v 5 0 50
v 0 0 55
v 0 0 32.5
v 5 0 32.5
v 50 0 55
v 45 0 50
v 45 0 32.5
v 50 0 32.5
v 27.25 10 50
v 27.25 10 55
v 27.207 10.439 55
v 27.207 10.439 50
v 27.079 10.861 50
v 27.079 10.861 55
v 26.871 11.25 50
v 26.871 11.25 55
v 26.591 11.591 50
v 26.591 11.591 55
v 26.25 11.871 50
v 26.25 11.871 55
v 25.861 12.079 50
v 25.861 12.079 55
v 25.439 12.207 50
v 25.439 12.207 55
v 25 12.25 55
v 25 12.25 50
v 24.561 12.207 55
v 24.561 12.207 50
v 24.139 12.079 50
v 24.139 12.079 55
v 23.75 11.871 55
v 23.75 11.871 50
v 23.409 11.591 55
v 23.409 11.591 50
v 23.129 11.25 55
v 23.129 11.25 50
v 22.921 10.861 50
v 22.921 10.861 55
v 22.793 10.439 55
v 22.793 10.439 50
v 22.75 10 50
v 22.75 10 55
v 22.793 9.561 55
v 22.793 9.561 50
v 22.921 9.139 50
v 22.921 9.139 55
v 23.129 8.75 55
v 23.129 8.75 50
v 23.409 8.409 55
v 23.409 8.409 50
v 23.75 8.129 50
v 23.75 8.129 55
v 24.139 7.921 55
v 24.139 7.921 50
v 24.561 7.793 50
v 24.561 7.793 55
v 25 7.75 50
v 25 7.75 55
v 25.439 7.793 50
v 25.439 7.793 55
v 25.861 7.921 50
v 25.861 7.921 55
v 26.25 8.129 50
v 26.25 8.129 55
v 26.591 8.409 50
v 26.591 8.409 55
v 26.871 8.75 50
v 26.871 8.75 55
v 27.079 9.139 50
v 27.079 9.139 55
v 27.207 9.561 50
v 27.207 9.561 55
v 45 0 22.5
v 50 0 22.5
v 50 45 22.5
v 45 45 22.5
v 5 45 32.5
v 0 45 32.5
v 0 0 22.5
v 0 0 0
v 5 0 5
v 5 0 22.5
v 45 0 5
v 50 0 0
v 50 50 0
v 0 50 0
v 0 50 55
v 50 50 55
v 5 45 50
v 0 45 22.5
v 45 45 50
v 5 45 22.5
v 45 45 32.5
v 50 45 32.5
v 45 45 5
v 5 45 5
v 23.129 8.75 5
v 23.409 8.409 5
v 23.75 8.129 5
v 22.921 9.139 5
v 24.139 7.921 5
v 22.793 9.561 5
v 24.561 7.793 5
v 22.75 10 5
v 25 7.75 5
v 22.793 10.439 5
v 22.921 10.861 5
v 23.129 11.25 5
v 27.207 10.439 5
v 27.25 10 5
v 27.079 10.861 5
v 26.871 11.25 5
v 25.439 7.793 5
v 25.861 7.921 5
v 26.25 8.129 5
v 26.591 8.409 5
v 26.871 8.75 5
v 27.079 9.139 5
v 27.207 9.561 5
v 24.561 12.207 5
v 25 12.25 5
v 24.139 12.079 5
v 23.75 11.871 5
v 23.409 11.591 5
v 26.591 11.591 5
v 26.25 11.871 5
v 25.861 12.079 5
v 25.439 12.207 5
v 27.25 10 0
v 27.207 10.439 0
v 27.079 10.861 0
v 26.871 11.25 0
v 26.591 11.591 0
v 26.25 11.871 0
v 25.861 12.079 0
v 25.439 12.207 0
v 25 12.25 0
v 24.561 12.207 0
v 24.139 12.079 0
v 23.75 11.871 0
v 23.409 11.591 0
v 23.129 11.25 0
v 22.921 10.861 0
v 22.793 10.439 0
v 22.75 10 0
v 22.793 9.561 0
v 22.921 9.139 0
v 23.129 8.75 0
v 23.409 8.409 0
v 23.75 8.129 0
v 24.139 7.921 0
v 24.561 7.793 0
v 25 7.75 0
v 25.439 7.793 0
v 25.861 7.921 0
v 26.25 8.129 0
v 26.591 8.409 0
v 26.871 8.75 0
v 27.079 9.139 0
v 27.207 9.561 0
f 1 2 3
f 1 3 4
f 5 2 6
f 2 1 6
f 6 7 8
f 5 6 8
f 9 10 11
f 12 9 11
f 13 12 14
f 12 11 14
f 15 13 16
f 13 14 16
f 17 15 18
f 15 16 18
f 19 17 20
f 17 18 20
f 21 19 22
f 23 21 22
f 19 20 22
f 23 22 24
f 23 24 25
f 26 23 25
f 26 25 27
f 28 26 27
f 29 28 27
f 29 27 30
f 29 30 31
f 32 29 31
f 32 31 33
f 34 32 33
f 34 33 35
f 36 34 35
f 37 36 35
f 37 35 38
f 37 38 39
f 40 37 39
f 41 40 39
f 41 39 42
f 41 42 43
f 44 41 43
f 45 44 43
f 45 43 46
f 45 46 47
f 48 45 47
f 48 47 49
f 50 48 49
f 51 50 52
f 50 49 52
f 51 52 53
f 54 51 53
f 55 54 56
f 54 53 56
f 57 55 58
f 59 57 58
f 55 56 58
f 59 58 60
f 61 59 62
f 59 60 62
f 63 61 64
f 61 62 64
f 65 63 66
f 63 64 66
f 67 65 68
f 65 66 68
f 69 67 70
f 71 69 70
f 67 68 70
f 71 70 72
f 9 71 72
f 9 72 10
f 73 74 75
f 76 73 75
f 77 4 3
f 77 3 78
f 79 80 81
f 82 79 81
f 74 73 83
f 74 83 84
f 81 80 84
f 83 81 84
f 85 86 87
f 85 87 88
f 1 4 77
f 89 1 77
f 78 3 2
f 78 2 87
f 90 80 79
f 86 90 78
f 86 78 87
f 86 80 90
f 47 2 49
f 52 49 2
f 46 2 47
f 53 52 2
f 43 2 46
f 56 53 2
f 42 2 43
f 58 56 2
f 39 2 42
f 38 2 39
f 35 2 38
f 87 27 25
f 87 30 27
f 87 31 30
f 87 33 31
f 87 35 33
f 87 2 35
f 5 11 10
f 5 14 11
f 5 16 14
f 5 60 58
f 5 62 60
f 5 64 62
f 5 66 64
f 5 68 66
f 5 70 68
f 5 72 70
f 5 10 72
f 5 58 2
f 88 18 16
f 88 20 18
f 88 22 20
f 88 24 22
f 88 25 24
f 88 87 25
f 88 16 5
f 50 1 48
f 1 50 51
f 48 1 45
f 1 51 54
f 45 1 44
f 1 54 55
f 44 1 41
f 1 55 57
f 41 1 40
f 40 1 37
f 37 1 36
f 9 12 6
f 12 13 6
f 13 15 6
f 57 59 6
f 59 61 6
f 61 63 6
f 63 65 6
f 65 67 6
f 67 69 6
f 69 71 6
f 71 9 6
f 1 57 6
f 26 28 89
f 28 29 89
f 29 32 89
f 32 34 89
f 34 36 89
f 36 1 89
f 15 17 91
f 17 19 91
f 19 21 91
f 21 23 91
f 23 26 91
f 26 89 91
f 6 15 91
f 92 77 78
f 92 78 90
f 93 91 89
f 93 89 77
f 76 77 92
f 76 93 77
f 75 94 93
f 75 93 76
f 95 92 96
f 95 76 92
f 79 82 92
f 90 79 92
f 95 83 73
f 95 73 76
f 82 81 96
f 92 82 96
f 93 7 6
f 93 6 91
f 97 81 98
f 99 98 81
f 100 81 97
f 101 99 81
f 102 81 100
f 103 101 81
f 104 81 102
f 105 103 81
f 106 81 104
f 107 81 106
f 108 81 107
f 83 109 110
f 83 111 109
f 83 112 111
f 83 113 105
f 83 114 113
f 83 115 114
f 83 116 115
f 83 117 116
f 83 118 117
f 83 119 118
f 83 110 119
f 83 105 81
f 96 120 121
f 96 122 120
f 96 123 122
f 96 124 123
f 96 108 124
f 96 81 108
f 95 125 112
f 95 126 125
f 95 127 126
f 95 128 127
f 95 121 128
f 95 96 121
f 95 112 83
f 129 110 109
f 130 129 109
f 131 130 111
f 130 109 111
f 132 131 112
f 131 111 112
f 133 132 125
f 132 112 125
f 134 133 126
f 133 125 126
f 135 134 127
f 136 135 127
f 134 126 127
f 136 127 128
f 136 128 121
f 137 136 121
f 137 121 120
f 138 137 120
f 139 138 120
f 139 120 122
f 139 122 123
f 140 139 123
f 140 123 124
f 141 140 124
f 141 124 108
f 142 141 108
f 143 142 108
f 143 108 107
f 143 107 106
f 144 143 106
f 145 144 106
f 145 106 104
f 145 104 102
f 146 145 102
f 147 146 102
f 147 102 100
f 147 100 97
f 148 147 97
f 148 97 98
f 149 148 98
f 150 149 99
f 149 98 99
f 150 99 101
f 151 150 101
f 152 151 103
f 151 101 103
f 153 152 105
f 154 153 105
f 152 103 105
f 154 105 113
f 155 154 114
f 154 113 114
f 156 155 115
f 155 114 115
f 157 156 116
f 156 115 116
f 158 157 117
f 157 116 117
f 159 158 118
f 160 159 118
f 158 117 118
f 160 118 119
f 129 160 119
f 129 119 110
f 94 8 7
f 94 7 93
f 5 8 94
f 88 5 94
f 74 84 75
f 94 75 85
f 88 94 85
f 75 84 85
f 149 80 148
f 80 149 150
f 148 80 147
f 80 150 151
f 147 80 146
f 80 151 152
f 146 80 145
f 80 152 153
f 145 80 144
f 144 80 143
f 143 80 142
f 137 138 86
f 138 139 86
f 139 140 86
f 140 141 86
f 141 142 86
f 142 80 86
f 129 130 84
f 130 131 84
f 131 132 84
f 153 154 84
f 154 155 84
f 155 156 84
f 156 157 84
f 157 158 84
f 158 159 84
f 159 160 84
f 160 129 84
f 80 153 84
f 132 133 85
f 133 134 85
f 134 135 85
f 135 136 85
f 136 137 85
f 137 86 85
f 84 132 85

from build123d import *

# Parameters (mm, degrees)
ESBO_O1_W                = 50
ESBO_O1_H                = 50
RESSALTO_EXTRUS_O1_DEPTH = 55
CASCA2_T                 = -5
ESBO_O2_R                = 2.25
CORTE_EXTRUS_O1_DEPTH    = 90.582364336
ESBO_O3_W                = 10
ESBO_O3_H                = 45
CORTE_EXTRUS_O2_DEPTH    = 90.582364336


with BuildPart() as part:
    # Esboço1 → Ressalto-extrusão1 (new body)
    with BuildSketch(Plane.XY):
        with Locations((25, 25)):
            Rectangle(ESBO_O1_W, ESBO_O1_H)
    extrude(amount=RESSALTO_EXTRUS_O1_DEPTH)

    # Casca2
    casca2_openings = [part.faces().sort_by_distance(p)[0] for p in [
        (25, 0, 27.5),
    ]]
    offset(amount=CASCA2_T, openings=casca2_openings, kind=Kind.INTERSECTION)

    # Esboço2 → Corte-extrusão1 (cut, through all)
    with BuildSketch(Plane.XY.offset(55)):
        with Locations((25, 10)):
            Circle(ESBO_O2_R)
    extrude(amount=-CORTE_EXTRUS_O1_DEPTH, mode=Mode.SUBTRACT)

    # Esboço3 → Corte-extrusão2 (cut, through all)
    with BuildSketch(Plane(origin=(50, 0, 0), x_dir=(0, 0, -1), z_dir=(1, 0, 0))):
        with Locations((-27.5, 22.5)):
            Rectangle(ESBO_O3_W, ESBO_O3_H)
    extrude(amount=-CORTE_EXTRUS_O2_DEPTH, mode=Mode.SUBTRACT)


solid = part.part
